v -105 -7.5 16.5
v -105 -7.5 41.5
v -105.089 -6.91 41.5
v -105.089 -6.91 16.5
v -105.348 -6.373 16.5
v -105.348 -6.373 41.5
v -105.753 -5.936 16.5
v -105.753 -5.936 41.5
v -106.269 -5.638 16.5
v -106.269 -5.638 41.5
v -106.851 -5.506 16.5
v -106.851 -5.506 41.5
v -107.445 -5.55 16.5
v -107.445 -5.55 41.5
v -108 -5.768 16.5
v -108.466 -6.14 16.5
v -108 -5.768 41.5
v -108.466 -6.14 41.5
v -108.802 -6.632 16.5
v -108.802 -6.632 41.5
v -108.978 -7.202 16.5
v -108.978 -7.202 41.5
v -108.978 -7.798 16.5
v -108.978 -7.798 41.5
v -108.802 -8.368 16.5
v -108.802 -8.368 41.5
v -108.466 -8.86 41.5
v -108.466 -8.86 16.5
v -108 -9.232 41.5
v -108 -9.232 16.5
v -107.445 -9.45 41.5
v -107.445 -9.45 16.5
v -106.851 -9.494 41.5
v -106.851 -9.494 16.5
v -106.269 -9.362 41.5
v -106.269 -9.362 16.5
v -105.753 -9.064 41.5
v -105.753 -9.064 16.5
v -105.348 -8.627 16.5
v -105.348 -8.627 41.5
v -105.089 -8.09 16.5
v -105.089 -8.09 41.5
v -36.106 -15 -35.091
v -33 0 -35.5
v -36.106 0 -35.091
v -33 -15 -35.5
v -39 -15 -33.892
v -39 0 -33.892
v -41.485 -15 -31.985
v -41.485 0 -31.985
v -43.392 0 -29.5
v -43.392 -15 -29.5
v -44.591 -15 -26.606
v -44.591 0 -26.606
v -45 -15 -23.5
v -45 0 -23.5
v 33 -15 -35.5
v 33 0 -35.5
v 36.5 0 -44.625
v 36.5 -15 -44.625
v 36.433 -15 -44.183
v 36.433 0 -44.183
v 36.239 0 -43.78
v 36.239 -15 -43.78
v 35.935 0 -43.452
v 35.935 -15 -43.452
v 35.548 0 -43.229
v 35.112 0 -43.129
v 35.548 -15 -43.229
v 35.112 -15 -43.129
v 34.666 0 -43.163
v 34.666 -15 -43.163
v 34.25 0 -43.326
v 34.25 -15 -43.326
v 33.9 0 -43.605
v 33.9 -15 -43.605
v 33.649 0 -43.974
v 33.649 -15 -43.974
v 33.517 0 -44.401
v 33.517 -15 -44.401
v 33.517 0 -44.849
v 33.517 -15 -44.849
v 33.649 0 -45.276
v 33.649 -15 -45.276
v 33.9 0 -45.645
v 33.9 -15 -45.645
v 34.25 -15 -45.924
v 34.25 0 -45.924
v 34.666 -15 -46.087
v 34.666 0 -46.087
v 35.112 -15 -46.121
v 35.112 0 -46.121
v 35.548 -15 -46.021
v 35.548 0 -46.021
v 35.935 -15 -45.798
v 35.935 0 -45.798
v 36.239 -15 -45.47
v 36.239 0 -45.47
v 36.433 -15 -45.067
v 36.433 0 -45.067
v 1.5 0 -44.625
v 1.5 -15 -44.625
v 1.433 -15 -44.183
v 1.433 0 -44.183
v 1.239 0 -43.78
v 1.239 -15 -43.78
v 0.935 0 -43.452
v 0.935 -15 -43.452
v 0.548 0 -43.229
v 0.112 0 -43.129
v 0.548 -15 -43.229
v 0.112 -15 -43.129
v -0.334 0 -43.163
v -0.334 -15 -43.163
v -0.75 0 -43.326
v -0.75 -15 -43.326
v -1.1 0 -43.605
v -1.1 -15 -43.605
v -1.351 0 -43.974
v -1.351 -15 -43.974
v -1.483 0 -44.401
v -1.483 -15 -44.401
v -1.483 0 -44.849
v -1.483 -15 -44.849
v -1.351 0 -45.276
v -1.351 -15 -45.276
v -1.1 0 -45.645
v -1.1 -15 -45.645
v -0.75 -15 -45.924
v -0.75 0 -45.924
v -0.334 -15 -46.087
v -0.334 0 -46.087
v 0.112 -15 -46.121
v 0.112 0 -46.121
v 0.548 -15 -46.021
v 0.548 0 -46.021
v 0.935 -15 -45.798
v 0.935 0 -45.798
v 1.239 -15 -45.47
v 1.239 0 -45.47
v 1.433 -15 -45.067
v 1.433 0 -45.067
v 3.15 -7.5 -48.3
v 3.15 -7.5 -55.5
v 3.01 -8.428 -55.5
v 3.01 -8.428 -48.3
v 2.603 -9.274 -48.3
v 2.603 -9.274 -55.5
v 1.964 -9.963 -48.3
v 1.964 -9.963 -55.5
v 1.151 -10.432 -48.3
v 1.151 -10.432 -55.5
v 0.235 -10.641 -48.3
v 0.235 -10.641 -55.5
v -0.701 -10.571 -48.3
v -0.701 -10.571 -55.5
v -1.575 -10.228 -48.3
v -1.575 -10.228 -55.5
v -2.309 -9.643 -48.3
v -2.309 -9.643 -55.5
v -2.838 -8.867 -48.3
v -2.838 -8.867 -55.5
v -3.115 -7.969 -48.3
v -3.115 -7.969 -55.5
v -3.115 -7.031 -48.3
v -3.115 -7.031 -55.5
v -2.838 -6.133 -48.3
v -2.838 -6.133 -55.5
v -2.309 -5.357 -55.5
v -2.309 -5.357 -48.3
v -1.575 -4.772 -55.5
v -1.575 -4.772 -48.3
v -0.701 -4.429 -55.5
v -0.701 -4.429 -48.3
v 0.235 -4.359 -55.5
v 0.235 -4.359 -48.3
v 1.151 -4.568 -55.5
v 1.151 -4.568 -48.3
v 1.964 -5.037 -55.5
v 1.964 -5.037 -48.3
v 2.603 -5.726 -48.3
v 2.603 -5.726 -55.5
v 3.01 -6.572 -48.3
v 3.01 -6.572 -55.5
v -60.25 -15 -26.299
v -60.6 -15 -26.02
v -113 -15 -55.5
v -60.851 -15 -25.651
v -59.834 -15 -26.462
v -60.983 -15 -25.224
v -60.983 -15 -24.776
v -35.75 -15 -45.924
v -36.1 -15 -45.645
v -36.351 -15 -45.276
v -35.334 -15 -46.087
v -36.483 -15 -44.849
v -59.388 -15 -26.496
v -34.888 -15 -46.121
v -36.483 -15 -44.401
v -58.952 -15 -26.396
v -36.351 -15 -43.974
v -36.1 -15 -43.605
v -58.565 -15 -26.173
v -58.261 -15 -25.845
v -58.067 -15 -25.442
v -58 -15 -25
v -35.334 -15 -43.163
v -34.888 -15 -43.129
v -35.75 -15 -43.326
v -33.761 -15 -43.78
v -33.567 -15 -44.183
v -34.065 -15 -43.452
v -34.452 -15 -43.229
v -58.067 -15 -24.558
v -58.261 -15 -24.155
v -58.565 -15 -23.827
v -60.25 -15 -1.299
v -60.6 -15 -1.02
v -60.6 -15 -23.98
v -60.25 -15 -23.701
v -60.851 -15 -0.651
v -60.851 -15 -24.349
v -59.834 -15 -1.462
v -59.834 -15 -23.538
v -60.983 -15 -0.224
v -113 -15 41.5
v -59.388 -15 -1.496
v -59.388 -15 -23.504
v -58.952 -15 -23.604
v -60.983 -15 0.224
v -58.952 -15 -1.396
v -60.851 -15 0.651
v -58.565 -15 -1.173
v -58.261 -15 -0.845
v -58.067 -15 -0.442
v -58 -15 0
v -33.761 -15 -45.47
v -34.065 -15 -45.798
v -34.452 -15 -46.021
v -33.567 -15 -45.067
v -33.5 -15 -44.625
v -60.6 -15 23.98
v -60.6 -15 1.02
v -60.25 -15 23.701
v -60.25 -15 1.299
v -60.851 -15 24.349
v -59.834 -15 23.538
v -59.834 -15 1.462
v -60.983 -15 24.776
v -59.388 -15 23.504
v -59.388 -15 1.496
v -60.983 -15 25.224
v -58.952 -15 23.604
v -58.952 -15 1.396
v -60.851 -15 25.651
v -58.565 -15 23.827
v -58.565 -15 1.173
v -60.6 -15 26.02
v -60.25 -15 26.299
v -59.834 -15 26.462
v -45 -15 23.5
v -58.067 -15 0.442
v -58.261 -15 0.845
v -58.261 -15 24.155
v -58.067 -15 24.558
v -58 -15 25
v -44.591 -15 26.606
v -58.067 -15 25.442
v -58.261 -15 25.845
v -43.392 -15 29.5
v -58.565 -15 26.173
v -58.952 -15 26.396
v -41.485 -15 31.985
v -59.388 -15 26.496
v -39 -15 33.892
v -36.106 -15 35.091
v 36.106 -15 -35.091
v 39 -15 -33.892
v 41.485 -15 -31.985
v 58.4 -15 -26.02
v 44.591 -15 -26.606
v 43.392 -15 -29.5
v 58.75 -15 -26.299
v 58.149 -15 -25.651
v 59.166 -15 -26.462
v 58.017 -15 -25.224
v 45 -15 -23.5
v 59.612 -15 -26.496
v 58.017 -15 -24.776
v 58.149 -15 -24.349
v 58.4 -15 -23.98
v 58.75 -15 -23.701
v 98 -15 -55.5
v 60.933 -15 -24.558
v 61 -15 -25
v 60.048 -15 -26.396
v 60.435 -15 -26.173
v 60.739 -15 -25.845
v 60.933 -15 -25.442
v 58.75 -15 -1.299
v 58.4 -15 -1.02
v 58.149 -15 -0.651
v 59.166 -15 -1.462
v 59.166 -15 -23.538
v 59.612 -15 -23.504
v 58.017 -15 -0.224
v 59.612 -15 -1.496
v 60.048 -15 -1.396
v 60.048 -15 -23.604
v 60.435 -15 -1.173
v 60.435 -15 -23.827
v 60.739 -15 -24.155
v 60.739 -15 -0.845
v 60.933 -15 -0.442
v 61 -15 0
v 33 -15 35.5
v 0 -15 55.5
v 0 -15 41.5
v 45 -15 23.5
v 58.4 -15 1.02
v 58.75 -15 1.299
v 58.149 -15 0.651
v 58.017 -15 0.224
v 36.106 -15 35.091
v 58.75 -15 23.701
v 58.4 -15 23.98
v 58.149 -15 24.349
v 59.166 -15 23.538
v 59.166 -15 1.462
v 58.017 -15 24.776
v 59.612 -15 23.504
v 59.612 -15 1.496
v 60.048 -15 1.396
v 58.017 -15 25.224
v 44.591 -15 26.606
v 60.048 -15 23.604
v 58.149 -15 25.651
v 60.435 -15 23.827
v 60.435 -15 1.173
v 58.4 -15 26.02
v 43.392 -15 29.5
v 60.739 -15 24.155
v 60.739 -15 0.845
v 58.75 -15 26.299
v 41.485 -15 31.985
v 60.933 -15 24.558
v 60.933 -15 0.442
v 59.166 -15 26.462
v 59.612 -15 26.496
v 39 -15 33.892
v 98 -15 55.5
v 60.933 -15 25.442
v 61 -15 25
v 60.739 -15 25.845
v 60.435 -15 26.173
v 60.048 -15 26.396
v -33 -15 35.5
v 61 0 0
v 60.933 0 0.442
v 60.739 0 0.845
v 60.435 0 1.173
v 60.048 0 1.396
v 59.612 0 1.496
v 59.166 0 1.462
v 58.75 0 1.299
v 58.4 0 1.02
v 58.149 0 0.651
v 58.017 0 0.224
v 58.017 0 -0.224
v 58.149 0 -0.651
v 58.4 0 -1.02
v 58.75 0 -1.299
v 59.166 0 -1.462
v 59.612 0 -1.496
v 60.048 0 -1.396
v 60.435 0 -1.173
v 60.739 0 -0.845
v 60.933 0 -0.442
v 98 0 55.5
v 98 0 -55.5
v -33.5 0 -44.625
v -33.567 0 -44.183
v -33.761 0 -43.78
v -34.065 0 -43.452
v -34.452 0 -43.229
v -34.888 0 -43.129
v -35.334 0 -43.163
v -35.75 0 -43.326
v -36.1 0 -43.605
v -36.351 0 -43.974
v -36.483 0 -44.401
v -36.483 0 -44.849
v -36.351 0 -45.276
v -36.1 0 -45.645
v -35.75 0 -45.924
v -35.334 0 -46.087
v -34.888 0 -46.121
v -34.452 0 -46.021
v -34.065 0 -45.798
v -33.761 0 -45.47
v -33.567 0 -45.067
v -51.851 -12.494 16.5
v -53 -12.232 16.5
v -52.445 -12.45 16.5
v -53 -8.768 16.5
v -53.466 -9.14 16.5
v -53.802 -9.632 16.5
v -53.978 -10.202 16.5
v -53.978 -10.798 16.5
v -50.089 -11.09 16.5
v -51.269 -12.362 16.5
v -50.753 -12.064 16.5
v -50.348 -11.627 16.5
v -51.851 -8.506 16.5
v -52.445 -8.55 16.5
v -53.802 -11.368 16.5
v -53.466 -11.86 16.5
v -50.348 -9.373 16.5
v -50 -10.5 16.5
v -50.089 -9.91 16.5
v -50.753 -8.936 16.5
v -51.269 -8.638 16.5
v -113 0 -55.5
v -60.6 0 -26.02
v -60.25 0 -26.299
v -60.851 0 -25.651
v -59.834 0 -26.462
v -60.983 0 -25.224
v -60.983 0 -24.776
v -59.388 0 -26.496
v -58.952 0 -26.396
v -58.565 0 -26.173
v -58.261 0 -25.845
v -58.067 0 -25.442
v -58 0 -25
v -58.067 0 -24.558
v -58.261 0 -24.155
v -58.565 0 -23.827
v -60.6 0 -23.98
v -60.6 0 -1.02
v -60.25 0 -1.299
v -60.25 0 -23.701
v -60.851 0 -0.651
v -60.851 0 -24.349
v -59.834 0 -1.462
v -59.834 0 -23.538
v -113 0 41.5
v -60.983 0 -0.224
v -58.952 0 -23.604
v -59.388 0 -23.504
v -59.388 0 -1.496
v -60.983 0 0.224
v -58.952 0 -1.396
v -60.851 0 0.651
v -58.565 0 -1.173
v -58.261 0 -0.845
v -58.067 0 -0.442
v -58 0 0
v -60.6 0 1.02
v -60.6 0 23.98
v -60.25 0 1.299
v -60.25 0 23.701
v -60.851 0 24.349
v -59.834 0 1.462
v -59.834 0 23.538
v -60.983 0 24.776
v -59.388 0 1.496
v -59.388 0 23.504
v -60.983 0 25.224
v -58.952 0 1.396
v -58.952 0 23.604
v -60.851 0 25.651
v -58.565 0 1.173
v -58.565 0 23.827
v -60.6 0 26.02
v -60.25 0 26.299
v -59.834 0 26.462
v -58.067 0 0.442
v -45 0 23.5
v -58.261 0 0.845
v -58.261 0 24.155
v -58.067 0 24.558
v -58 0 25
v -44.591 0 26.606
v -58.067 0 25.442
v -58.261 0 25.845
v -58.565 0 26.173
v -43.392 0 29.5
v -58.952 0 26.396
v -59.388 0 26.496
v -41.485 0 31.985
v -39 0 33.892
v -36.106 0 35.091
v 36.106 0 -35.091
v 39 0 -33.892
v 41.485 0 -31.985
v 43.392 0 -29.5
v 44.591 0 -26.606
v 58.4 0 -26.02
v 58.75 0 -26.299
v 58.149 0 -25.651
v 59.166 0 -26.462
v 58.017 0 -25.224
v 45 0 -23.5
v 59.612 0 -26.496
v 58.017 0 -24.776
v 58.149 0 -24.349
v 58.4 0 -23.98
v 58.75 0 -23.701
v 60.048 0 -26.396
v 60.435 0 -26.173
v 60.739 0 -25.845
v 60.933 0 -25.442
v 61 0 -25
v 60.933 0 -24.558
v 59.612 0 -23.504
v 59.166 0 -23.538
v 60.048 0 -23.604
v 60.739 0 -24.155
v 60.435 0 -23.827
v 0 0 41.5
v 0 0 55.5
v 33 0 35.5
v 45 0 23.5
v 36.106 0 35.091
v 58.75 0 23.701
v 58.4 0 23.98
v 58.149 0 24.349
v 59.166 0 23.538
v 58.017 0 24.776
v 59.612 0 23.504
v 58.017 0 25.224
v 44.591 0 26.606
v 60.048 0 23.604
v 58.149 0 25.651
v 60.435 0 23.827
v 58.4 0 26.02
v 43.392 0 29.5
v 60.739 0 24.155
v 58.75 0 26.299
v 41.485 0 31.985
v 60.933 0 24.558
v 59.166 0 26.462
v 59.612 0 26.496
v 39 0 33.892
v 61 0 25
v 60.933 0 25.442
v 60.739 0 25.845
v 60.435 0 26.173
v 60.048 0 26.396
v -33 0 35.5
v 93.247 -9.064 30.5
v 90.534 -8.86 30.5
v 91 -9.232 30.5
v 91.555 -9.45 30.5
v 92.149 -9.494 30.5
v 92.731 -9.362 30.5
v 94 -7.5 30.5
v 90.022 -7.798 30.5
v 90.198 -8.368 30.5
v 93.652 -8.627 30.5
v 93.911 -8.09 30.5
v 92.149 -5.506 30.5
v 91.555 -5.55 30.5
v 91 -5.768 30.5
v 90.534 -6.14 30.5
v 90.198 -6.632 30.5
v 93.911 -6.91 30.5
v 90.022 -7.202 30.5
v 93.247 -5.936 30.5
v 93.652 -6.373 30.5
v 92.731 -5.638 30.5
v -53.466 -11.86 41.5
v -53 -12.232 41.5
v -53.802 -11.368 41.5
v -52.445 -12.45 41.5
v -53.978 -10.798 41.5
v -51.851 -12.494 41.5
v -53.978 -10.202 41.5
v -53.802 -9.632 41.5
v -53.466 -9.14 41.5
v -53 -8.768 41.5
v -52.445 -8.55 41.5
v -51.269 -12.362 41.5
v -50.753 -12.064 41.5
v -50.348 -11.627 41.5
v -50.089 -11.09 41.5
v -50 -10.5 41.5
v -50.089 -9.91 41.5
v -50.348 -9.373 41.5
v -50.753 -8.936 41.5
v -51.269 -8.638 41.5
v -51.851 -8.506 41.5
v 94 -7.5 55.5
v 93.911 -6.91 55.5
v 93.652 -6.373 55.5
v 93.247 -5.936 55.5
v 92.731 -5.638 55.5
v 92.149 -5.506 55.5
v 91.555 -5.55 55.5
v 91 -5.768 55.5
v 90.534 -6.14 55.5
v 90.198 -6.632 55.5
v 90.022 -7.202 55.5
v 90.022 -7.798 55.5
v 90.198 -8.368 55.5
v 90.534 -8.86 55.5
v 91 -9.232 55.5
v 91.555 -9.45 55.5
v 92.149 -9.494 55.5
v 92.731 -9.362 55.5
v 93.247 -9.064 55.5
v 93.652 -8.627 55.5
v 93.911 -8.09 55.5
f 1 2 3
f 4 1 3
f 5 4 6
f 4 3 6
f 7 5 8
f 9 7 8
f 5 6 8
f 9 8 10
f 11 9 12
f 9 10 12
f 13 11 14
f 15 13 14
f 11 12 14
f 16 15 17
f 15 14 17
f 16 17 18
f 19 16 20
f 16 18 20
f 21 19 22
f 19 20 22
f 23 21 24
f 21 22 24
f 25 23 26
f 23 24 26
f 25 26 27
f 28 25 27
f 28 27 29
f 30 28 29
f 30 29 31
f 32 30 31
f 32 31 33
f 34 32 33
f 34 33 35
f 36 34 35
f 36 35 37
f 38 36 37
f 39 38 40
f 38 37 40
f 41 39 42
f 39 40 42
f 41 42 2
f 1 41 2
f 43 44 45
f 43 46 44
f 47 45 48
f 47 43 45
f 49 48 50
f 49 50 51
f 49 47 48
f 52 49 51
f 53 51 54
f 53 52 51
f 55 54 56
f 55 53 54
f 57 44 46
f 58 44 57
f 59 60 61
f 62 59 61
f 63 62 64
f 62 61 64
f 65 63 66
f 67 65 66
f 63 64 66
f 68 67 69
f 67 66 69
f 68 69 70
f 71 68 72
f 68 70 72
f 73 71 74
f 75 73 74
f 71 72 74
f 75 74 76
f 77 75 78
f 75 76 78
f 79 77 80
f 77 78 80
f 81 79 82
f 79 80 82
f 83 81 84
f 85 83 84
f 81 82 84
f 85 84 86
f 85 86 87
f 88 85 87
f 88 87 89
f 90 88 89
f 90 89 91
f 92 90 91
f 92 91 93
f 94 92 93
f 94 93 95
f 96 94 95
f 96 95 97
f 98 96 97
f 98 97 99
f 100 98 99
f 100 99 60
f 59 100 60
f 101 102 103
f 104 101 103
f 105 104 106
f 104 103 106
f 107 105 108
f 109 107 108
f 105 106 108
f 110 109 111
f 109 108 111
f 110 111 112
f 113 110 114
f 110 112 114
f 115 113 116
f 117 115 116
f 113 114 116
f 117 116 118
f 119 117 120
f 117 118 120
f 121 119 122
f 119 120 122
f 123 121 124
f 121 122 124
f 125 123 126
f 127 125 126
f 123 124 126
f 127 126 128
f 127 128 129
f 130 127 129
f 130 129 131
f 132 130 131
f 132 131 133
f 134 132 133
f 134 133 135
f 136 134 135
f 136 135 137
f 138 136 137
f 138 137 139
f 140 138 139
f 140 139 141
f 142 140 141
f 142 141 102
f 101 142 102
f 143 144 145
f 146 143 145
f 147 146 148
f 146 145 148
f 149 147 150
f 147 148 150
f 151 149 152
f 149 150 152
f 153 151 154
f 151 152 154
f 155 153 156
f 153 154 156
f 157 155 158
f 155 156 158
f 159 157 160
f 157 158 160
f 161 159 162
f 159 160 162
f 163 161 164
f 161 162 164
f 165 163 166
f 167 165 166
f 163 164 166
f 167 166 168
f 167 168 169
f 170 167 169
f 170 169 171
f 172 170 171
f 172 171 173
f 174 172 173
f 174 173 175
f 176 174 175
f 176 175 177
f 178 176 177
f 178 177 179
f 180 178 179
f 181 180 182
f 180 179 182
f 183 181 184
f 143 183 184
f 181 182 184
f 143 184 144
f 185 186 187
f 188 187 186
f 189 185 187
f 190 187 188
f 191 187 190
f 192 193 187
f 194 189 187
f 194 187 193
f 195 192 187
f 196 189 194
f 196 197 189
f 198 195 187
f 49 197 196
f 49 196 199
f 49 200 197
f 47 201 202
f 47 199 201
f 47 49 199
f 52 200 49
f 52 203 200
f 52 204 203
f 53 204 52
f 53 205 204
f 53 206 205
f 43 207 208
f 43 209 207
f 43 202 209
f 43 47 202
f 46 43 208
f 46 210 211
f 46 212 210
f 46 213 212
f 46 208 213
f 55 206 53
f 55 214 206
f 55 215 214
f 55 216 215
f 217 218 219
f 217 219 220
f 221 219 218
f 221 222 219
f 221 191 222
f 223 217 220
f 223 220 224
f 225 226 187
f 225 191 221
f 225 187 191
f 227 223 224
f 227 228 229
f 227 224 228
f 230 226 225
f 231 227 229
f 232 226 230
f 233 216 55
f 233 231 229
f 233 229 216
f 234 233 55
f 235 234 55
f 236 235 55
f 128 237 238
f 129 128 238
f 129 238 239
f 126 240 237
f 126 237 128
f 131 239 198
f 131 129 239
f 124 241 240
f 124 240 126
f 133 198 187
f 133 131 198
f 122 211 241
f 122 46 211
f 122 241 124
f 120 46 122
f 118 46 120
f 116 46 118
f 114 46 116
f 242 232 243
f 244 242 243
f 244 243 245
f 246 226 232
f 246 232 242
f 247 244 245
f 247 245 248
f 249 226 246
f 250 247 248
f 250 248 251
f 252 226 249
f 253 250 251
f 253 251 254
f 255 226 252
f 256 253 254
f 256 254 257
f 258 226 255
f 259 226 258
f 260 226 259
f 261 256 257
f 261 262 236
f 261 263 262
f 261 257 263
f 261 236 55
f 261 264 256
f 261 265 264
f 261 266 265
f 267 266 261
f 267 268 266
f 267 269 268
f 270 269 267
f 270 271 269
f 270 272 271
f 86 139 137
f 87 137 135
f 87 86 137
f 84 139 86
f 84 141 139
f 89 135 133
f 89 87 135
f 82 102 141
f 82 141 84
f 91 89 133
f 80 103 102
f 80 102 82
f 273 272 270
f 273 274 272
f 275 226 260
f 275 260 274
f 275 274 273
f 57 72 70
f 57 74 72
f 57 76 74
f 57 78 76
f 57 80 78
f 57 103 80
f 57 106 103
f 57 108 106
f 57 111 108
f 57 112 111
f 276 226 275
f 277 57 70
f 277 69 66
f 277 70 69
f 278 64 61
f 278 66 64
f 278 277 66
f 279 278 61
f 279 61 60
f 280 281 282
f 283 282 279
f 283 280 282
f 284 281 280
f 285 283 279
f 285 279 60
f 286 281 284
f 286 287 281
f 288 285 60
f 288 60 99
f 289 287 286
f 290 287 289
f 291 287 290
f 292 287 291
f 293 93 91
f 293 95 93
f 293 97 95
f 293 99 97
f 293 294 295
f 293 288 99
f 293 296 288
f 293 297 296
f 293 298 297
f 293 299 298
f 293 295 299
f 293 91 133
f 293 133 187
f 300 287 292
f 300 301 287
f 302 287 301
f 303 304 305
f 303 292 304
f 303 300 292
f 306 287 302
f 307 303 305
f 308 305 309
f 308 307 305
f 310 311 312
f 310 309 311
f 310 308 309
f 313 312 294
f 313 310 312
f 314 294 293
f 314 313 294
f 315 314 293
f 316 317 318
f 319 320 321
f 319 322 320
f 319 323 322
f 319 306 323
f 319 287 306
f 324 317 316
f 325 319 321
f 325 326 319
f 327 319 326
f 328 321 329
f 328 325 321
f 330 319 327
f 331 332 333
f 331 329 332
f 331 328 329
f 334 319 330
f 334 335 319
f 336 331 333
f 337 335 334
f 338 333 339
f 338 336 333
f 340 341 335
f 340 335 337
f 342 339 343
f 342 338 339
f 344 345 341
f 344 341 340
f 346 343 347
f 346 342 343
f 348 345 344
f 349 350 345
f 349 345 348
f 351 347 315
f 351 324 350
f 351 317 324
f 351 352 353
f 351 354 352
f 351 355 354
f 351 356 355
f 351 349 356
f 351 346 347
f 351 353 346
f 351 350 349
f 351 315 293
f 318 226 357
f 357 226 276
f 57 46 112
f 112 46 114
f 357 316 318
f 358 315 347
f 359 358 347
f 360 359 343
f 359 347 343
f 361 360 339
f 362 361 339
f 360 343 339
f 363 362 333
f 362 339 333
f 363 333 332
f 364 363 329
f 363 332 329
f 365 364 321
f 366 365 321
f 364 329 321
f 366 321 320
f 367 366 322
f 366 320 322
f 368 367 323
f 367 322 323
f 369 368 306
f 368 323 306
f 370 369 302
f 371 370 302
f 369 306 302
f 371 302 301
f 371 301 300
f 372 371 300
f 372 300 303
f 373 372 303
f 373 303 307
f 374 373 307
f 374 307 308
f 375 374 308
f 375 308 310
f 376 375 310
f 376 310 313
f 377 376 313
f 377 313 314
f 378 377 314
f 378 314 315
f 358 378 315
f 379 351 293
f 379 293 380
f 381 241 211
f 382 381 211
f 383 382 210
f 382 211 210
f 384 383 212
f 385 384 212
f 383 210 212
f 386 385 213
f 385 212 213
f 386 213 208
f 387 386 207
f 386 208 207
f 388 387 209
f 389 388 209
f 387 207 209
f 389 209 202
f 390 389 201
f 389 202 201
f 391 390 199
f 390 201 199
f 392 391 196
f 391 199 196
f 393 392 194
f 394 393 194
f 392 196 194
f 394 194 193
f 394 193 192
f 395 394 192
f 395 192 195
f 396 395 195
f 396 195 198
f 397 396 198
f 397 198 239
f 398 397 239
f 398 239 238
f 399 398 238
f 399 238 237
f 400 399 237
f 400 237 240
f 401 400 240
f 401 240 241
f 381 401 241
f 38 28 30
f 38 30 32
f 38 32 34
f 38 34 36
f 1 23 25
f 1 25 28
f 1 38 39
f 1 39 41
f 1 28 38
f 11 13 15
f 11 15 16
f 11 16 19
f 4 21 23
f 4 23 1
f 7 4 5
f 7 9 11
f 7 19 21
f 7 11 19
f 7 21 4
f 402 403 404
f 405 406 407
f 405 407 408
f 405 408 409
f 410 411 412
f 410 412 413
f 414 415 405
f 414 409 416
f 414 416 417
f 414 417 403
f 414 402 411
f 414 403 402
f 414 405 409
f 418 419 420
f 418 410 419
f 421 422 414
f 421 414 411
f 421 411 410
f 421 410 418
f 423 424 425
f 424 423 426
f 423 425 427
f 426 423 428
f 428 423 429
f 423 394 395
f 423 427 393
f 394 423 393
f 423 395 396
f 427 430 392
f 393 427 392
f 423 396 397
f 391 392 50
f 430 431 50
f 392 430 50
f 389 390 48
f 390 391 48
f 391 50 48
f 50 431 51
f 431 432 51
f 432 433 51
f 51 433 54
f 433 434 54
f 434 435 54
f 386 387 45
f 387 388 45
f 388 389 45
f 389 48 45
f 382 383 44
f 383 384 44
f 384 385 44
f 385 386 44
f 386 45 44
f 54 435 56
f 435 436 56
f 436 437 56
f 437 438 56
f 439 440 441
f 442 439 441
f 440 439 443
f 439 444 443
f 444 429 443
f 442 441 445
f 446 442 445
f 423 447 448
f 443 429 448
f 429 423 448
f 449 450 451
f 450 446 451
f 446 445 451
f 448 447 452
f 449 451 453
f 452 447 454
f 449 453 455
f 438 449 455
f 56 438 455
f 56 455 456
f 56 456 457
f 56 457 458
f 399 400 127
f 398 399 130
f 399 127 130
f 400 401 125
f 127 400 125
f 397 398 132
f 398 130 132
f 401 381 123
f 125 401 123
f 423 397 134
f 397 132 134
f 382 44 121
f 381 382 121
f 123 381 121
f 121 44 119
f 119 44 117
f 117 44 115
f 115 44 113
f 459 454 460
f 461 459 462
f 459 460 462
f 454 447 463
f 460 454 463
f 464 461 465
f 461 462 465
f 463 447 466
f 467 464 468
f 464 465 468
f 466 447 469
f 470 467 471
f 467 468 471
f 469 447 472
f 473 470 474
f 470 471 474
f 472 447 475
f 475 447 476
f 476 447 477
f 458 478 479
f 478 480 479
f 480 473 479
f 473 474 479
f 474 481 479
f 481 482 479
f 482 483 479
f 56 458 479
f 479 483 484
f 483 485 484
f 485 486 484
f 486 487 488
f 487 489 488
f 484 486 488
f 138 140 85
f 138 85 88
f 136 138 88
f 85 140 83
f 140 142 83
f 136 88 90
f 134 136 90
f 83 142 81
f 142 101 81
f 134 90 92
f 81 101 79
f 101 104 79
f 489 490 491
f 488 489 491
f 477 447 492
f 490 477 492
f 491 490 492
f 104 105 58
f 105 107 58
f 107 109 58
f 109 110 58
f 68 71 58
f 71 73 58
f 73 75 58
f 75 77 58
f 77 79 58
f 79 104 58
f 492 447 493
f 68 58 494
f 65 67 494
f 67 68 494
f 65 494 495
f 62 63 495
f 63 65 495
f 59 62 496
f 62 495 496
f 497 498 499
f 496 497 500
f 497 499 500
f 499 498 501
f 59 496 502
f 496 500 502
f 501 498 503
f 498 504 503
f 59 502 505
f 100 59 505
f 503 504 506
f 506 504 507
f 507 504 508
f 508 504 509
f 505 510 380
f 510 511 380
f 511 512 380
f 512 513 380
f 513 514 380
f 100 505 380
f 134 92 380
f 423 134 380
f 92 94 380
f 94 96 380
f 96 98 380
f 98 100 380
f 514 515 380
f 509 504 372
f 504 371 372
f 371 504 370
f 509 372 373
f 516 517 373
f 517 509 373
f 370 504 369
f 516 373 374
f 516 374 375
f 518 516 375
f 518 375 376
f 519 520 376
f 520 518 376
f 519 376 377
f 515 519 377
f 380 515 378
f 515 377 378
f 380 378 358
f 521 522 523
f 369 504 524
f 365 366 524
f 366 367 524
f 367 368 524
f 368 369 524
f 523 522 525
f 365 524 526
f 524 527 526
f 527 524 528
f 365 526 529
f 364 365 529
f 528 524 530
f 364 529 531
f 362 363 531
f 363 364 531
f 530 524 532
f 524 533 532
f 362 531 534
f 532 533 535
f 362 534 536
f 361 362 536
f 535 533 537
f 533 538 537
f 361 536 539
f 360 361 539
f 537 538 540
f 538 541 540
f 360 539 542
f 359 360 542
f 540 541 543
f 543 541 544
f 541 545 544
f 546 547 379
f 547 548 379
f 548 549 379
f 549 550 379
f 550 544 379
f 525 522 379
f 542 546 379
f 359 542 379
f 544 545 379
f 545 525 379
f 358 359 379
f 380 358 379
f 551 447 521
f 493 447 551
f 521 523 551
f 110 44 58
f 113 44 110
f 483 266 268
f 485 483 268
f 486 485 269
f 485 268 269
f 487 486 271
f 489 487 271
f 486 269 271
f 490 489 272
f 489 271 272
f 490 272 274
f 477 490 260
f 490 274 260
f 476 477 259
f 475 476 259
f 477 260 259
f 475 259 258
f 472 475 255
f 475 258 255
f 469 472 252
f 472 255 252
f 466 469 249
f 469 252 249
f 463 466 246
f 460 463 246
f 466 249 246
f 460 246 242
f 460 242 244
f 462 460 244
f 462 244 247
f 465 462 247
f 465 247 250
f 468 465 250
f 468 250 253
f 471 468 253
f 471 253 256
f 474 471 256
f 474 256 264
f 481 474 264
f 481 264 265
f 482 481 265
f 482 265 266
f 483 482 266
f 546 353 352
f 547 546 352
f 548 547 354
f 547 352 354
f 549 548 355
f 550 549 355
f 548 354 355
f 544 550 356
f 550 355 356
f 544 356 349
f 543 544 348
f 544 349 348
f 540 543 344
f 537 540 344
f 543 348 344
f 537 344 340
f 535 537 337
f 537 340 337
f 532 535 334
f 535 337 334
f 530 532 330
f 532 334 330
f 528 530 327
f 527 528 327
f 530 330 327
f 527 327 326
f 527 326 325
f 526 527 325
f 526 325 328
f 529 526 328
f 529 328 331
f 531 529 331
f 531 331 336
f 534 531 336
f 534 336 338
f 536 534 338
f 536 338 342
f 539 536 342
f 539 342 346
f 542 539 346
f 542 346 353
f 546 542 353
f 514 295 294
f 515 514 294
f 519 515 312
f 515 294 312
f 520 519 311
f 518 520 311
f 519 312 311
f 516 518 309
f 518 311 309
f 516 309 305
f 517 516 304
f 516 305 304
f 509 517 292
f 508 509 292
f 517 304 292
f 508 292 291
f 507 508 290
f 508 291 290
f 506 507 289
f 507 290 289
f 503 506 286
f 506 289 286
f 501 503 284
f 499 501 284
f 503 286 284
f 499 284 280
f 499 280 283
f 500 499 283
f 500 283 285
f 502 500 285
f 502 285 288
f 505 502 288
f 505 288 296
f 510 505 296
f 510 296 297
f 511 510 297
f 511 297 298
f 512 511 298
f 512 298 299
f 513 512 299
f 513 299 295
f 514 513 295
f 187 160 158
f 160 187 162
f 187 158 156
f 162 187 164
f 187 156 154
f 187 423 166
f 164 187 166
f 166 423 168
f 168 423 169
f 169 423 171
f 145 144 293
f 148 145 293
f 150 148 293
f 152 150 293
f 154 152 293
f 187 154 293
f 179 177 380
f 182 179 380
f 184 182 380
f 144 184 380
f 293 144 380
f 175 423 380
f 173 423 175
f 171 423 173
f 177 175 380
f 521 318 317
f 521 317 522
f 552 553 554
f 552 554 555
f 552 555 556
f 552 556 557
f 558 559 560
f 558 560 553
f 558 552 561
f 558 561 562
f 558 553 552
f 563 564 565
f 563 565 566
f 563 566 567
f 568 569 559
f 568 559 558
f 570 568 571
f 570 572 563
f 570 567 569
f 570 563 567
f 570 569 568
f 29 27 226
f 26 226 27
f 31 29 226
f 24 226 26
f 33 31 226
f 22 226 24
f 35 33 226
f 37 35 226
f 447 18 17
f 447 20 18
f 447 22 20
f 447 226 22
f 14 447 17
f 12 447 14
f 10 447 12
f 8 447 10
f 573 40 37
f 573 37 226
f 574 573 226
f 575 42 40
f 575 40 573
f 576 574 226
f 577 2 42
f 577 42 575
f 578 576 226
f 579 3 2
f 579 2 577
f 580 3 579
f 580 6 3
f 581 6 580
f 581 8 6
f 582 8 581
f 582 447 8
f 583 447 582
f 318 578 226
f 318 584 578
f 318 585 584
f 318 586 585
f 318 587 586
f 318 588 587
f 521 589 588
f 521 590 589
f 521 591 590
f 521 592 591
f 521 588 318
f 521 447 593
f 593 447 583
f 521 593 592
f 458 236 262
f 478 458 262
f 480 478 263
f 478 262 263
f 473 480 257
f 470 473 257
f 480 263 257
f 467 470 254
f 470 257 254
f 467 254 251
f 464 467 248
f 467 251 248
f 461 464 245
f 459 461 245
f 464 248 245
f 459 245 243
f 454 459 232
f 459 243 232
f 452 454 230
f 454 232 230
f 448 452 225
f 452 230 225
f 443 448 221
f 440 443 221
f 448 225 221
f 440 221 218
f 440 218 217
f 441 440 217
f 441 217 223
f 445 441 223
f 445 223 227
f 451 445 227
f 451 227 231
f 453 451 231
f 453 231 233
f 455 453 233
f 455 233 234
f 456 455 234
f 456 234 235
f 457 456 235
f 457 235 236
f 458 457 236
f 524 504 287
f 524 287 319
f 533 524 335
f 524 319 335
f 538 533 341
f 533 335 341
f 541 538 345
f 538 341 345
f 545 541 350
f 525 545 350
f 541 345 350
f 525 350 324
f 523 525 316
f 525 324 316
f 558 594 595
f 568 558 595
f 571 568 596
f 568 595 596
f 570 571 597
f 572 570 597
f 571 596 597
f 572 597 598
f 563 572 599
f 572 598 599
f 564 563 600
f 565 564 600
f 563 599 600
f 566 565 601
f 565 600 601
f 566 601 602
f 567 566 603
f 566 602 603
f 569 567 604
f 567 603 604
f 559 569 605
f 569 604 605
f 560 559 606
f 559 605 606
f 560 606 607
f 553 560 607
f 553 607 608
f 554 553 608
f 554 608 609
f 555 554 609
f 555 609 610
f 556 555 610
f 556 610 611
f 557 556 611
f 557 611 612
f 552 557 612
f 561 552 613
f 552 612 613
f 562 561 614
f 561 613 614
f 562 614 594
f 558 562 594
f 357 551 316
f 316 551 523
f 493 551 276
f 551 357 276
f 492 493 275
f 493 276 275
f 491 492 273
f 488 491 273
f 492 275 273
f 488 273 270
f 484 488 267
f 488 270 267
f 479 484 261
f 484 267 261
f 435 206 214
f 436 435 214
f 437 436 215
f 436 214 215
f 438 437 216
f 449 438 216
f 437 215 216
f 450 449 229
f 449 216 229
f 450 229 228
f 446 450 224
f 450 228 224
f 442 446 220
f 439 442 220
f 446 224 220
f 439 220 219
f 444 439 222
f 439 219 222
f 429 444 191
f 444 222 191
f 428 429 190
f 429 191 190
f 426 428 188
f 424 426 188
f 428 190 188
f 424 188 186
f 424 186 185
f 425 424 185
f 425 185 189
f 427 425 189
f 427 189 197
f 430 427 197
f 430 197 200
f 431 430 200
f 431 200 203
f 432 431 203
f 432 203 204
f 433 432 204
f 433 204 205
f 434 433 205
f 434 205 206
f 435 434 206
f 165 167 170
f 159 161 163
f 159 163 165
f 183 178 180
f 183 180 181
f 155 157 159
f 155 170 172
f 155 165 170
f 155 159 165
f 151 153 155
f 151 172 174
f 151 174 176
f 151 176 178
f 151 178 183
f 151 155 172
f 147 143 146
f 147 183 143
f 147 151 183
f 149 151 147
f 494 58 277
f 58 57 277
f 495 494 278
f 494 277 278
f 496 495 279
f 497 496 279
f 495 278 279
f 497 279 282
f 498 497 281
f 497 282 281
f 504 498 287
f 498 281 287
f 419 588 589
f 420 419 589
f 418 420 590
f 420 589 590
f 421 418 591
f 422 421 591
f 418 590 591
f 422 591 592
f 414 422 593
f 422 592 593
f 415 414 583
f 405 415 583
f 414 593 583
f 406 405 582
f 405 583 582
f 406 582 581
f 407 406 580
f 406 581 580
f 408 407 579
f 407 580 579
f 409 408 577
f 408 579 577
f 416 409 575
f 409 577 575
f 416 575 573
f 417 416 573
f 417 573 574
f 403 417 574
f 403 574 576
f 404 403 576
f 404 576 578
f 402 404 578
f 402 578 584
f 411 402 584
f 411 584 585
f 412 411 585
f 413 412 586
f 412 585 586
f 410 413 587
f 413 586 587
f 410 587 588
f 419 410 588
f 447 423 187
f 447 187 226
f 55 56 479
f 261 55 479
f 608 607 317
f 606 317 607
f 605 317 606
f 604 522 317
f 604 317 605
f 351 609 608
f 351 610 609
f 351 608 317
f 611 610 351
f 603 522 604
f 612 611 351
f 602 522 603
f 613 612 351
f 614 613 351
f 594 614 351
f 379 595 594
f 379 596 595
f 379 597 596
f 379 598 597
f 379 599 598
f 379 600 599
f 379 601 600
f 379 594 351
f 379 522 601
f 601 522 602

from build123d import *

# Parameters (mm, degrees)
F0_W      = 226
F0_H      = 111
F0_W_2    = 90
F0_H_2    = 71
F1_DEPTH  = 15
F2_R      = 12
F3_R      = 1.5
F4_DEPTH  = 25
F5_R      = 1.5
F6_DEPTH  = 25
F7_W      = 25
F7_H      = 15
F8_DEPTH  = 115.3
F9_W      = 201
F9_H      = 15
F10_DEPTH = 14
F11_W     = 88
F11_H     = 15
F12_DEPTH = 14
F13_W     = 81
F13_H     = 65
F14_DEPTH = 5
F15_W     = 10
F15_H     = 15
F16_DEPTH = 111
F17_W     = 81
F17_H     = 65
F18_DEPTH = 5
F19_R     = 2
F20_DEPTH = 25
F21_R     = 3.15
F22_DEPTH = 7.2
F23_R     = 2
F24_DEPTH = 25
F25_R     = 2
F26_DEPTH = 25


with BuildPart() as f1:
    # F0 (on Front) → F1 (new body)
    with BuildSketch(Plane.XZ):
        Rectangle(F0_W, F0_H)
        Rectangle(F0_W_2, F0_H_2, mode=Mode.SUBTRACT)
    extrude(amount=F1_DEPTH)

    # F2
    f2_edges = [f1.edges().sort_by_distance(p)[0] for p in [
        (45, -7.5, 35.5),
        (45, -7.5, -35.5),
        (-45, -7.5, -35.5),
        (-45, -7.5, 35.5),
    ]]
    fillet(f2_edges, radius=F2_R)

    # F3 (on face) → F4 (cut)
    with BuildSketch(Plane.XZ.offset(15)):
        with Locations((-59.5, 0)):
            Circle(F3_R)
        with Locations((-59.5, 25)):
            Circle(F3_R)
        with Locations((-59.5, -25)):
            Circle(F3_R)
        with Locations((59.5, 0)):
            Circle(F3_R)
        with Locations((59.5, 25)):
            Circle(F3_R)
        with Locations((59.5, -25)):
            Circle(F3_R)
    extrude(amount=-F4_DEPTH, mode=Mode.SUBTRACT)

    # F5 (on face) → F6 (cut)
    with BuildSketch(Plane.XZ.offset(15)):
        with Locations((0, -44.625)):
            Circle(F5_R)
        with Locations((35, -44.625)):
            Circle(F5_R)
        with Locations((0, 44.625)):
            Circle(F5_R)
        with Locations((-35, 44.625)):
            Circle(F5_R)
        with Locations((-35, -44.625)):
            Circle(F5_R)
        with Locations((35, 44.625)):
            Circle(F5_R)
    extrude(amount=-F6_DEPTH, mode=Mode.SUBTRACT)

    # F7 (on face) → F8 (cut)
    with BuildSketch(Plane.XY.offset(55.5)):
        with Locations((100.5, -7.5)):
            Rectangle(F7_W, F7_H)
    extrude(amount=-F8_DEPTH, mode=Mode.SUBTRACT)

    # F9 (on face) → F10 (cut)
    with BuildSketch(Plane.XY.offset(55.5)):
        with Locations((-12.5, -7.5)):
            Rectangle(F9_W, F9_H)
    extrude(amount=-F10_DEPTH, mode=Mode.SUBTRACT)

    # F11 (on face) → F12 (join)
    with BuildSketch(Plane.XY.offset(41.5)):
        with Locations((44, -7.5)):
            Rectangle(F11_W, F11_H)
    extrude(amount=F12_DEPTH)

    # F13 (on face) → F14 (join)
    with BuildSketch(Plane.XY.offset(55.5)):
        with Locations((22.5, -32.5)):
            Rectangle(F13_W, F13_H)
    extrude(amount=F14_DEPTH)

    # F15 (on face) → F16 (join)
    with BuildSketch(Plane.XY.offset(55.5)):
        with Locations((93, -7.5)):
            Rectangle(F15_W, F15_H)
    extrude(amount=-F16_DEPTH)

    # F17 (on face) → F18 (cut)
    with BuildSketch(Plane.XY.offset(60.5)):
        with Locations((22.5, -32.5)):
            Rectangle(F17_W, F17_H)
    extrude(amount=-F18_DEPTH, mode=Mode.SUBTRACT)

    # F19 (on face) → F20 (cut)
    with BuildSketch(Plane.XY.offset(41.5)):
        with Locations((-52, -10.5)):
            Circle(F19_R)
    extrude(amount=-F20_DEPTH, mode=Mode.SUBTRACT)

    # F21 (on face) → F22 (cut)
    with BuildSketch(Plane(origin=(0, 0, -55.5), x_dir=(1, 0, 0), z_dir=(0, 0, -1))):
        with Locations((0, 7.5)):
            Circle(F21_R)
    extrude(amount=-F22_DEPTH, mode=Mode.SUBTRACT)

    # F23 (on face) → F24 (cut)
    with BuildSketch(Plane.XY.offset(41.5)):
        with Locations((-107, -7.5)):
            Circle(F23_R)
    extrude(amount=-F24_DEPTH, mode=Mode.SUBTRACT)

    # F25 (on face) → F26 (cut)
    with BuildSketch(Plane.XY.offset(55.5)):
        with Locations((92, -7.5)):
            Circle(F25_R)
    extrude(amount=-F26_DEPTH, mode=Mode.SUBTRACT)


solid = f1.part
